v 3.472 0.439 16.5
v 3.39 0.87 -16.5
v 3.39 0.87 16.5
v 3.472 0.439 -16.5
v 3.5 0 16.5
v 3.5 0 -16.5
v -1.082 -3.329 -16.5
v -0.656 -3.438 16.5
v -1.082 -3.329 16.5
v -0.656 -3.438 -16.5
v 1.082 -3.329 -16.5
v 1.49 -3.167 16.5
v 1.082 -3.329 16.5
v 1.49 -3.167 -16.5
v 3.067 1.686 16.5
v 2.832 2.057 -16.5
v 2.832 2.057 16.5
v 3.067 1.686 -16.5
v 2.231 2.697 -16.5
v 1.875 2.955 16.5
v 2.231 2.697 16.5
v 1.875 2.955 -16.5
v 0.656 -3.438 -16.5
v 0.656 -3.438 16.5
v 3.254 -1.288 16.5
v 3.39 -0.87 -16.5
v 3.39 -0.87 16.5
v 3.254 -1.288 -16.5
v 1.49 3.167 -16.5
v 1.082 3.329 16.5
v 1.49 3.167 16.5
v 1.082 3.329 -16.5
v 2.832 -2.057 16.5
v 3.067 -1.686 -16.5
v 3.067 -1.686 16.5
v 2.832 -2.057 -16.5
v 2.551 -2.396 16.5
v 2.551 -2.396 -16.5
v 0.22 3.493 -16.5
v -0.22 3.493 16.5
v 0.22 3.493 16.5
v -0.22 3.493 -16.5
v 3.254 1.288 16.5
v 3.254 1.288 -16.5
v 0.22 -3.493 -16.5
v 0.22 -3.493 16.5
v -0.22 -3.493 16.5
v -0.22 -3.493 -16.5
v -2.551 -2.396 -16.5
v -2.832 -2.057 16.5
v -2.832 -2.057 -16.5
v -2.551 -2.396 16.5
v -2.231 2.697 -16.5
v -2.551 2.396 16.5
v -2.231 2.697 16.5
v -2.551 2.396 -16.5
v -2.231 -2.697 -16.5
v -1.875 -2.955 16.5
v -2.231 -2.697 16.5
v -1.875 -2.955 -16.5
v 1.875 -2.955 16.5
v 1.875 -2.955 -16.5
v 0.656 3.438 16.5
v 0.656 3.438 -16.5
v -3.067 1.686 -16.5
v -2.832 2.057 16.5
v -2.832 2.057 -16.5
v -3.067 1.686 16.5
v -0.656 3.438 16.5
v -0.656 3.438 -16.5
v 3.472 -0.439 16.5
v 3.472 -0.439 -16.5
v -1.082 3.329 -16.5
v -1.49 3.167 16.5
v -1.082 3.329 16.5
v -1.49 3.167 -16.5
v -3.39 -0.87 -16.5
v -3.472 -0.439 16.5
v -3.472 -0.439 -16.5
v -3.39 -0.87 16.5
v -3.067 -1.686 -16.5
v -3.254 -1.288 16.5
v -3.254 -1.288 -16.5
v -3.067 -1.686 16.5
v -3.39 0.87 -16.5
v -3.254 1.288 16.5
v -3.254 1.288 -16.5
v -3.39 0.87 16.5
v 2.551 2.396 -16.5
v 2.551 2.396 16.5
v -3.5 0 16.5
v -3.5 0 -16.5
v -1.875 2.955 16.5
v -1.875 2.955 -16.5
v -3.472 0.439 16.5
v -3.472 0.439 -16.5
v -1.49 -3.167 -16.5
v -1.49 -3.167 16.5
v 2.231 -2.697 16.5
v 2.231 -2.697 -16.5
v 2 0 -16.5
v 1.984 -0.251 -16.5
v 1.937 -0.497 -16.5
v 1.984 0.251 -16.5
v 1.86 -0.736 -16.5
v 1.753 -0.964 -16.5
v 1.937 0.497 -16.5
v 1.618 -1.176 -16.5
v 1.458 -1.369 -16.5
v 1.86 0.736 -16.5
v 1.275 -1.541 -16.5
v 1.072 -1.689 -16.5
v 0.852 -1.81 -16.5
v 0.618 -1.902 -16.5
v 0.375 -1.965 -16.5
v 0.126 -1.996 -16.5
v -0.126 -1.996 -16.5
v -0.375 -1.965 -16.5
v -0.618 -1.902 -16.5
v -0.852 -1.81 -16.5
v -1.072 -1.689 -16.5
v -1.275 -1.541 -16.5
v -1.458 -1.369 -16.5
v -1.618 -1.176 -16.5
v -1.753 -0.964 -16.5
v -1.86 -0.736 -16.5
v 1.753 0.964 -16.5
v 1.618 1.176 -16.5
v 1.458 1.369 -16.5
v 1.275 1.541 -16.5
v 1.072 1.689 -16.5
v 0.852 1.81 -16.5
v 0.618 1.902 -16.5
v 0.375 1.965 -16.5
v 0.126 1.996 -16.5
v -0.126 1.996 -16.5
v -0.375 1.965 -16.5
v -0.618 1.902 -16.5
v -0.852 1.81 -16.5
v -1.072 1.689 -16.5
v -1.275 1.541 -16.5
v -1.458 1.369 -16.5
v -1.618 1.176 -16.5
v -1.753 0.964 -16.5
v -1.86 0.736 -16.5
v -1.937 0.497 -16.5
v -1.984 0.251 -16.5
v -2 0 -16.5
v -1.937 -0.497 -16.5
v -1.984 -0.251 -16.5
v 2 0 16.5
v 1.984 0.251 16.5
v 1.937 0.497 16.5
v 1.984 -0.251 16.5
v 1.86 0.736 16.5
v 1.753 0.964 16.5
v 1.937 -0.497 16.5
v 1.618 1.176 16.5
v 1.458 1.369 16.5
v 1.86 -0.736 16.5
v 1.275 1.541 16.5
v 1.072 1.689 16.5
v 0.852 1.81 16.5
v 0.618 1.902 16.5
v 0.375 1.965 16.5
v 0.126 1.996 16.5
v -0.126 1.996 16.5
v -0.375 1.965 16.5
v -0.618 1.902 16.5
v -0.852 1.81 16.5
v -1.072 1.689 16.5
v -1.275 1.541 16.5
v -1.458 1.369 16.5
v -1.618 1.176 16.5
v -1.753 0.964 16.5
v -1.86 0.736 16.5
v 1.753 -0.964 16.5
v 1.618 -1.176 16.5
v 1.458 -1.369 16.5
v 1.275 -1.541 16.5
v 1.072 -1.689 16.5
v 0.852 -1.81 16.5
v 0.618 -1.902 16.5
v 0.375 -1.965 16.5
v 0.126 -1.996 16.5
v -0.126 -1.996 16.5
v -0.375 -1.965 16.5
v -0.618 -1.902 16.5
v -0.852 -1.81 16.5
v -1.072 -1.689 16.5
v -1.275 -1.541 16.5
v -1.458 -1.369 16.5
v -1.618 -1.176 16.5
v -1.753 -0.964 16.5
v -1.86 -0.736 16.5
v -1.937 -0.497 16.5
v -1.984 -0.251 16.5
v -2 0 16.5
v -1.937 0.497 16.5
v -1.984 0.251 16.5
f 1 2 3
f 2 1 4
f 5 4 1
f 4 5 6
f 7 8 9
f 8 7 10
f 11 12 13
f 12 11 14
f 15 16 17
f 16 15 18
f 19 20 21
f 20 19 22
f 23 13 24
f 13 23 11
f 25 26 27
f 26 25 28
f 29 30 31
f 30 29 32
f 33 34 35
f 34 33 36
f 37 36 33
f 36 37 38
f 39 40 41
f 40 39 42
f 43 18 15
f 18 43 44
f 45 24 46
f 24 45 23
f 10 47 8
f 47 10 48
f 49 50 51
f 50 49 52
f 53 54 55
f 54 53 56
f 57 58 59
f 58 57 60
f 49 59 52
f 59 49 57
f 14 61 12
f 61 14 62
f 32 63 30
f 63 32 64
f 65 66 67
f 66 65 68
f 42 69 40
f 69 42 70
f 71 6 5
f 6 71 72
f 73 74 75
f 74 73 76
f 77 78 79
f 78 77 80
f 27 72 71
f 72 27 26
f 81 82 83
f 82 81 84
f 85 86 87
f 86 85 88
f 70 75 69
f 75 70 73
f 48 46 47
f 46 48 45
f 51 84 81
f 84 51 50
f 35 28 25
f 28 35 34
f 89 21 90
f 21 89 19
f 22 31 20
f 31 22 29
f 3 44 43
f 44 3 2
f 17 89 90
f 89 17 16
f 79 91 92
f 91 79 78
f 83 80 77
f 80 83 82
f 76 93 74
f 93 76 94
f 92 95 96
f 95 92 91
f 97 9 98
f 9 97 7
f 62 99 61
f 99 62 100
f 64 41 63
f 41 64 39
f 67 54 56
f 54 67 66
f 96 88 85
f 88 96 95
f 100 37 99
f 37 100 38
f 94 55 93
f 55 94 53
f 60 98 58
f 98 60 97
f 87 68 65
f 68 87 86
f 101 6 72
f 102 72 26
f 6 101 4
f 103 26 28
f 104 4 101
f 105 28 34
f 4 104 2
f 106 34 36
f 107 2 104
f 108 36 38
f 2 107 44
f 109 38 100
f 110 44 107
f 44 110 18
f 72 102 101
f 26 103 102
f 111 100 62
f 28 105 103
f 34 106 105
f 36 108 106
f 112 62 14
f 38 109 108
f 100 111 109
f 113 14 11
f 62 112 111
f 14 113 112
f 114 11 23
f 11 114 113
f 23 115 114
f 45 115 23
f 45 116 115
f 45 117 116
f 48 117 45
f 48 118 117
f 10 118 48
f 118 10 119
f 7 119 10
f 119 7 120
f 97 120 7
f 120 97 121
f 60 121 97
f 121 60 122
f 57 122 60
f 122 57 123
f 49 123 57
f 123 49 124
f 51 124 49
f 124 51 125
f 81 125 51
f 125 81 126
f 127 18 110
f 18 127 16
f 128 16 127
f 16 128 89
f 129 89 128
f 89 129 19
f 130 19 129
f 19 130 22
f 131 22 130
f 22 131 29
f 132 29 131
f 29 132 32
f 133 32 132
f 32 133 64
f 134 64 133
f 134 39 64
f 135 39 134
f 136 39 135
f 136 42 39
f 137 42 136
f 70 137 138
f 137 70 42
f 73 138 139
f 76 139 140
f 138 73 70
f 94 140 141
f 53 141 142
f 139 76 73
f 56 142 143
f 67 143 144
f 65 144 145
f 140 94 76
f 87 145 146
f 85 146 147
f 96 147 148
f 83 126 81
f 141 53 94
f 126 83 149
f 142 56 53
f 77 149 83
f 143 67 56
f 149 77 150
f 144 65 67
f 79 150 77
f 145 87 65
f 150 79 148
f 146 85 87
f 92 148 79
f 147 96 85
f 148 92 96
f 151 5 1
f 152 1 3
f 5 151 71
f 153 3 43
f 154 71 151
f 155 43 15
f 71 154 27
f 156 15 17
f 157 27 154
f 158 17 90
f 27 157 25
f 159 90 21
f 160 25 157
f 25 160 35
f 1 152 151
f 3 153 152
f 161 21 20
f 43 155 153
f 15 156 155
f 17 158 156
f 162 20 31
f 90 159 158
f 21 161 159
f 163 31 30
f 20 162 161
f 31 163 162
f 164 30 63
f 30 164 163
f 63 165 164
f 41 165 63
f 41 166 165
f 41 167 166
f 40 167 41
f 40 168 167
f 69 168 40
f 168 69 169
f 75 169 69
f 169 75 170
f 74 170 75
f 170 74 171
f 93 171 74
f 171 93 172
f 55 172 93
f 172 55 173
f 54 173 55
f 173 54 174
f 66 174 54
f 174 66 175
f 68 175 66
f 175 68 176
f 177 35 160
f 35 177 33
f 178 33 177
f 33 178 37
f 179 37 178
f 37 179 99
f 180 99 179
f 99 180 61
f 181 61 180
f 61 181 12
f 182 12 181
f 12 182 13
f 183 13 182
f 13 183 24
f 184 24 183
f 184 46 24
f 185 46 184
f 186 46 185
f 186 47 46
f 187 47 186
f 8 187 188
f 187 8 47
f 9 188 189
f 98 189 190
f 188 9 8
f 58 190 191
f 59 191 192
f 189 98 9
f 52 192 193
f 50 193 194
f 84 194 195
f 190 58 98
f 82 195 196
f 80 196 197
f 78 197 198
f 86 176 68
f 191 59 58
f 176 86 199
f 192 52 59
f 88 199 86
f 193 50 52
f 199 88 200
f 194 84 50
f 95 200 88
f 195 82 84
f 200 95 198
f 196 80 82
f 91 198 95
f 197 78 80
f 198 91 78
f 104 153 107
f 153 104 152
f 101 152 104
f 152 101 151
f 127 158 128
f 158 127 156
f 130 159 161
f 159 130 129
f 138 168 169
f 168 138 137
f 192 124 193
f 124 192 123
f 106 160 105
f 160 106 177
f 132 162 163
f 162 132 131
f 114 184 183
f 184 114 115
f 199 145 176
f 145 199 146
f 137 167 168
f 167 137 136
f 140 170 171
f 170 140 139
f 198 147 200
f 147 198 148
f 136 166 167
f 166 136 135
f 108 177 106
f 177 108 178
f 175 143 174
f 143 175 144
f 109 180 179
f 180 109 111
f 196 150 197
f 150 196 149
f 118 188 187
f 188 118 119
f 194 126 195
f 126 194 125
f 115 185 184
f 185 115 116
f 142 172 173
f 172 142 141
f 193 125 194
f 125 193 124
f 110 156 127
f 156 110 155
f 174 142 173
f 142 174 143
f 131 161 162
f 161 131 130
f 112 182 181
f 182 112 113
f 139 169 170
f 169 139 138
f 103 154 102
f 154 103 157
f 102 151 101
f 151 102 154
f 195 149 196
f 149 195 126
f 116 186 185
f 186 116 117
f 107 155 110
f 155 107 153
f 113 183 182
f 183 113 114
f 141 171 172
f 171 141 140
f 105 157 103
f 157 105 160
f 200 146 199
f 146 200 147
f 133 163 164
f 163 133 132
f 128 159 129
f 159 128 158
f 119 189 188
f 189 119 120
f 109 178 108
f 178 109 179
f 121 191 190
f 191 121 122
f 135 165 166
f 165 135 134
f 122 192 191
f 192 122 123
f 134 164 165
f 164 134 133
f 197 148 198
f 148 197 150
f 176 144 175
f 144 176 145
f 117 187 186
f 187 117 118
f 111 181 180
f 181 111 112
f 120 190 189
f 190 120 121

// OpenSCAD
$fn = 50;


difference() {
	union() {
		translate(v = [0, 0, -16.5000000000]) {
			cylinder(h = 33, r = 3.5000000000);
		}
	}
	union() {
		translate(v = [0, 0, -100.0000000000]) {
			cylinder(h = 200, r = 2.0000000000);
		}
	}
}
